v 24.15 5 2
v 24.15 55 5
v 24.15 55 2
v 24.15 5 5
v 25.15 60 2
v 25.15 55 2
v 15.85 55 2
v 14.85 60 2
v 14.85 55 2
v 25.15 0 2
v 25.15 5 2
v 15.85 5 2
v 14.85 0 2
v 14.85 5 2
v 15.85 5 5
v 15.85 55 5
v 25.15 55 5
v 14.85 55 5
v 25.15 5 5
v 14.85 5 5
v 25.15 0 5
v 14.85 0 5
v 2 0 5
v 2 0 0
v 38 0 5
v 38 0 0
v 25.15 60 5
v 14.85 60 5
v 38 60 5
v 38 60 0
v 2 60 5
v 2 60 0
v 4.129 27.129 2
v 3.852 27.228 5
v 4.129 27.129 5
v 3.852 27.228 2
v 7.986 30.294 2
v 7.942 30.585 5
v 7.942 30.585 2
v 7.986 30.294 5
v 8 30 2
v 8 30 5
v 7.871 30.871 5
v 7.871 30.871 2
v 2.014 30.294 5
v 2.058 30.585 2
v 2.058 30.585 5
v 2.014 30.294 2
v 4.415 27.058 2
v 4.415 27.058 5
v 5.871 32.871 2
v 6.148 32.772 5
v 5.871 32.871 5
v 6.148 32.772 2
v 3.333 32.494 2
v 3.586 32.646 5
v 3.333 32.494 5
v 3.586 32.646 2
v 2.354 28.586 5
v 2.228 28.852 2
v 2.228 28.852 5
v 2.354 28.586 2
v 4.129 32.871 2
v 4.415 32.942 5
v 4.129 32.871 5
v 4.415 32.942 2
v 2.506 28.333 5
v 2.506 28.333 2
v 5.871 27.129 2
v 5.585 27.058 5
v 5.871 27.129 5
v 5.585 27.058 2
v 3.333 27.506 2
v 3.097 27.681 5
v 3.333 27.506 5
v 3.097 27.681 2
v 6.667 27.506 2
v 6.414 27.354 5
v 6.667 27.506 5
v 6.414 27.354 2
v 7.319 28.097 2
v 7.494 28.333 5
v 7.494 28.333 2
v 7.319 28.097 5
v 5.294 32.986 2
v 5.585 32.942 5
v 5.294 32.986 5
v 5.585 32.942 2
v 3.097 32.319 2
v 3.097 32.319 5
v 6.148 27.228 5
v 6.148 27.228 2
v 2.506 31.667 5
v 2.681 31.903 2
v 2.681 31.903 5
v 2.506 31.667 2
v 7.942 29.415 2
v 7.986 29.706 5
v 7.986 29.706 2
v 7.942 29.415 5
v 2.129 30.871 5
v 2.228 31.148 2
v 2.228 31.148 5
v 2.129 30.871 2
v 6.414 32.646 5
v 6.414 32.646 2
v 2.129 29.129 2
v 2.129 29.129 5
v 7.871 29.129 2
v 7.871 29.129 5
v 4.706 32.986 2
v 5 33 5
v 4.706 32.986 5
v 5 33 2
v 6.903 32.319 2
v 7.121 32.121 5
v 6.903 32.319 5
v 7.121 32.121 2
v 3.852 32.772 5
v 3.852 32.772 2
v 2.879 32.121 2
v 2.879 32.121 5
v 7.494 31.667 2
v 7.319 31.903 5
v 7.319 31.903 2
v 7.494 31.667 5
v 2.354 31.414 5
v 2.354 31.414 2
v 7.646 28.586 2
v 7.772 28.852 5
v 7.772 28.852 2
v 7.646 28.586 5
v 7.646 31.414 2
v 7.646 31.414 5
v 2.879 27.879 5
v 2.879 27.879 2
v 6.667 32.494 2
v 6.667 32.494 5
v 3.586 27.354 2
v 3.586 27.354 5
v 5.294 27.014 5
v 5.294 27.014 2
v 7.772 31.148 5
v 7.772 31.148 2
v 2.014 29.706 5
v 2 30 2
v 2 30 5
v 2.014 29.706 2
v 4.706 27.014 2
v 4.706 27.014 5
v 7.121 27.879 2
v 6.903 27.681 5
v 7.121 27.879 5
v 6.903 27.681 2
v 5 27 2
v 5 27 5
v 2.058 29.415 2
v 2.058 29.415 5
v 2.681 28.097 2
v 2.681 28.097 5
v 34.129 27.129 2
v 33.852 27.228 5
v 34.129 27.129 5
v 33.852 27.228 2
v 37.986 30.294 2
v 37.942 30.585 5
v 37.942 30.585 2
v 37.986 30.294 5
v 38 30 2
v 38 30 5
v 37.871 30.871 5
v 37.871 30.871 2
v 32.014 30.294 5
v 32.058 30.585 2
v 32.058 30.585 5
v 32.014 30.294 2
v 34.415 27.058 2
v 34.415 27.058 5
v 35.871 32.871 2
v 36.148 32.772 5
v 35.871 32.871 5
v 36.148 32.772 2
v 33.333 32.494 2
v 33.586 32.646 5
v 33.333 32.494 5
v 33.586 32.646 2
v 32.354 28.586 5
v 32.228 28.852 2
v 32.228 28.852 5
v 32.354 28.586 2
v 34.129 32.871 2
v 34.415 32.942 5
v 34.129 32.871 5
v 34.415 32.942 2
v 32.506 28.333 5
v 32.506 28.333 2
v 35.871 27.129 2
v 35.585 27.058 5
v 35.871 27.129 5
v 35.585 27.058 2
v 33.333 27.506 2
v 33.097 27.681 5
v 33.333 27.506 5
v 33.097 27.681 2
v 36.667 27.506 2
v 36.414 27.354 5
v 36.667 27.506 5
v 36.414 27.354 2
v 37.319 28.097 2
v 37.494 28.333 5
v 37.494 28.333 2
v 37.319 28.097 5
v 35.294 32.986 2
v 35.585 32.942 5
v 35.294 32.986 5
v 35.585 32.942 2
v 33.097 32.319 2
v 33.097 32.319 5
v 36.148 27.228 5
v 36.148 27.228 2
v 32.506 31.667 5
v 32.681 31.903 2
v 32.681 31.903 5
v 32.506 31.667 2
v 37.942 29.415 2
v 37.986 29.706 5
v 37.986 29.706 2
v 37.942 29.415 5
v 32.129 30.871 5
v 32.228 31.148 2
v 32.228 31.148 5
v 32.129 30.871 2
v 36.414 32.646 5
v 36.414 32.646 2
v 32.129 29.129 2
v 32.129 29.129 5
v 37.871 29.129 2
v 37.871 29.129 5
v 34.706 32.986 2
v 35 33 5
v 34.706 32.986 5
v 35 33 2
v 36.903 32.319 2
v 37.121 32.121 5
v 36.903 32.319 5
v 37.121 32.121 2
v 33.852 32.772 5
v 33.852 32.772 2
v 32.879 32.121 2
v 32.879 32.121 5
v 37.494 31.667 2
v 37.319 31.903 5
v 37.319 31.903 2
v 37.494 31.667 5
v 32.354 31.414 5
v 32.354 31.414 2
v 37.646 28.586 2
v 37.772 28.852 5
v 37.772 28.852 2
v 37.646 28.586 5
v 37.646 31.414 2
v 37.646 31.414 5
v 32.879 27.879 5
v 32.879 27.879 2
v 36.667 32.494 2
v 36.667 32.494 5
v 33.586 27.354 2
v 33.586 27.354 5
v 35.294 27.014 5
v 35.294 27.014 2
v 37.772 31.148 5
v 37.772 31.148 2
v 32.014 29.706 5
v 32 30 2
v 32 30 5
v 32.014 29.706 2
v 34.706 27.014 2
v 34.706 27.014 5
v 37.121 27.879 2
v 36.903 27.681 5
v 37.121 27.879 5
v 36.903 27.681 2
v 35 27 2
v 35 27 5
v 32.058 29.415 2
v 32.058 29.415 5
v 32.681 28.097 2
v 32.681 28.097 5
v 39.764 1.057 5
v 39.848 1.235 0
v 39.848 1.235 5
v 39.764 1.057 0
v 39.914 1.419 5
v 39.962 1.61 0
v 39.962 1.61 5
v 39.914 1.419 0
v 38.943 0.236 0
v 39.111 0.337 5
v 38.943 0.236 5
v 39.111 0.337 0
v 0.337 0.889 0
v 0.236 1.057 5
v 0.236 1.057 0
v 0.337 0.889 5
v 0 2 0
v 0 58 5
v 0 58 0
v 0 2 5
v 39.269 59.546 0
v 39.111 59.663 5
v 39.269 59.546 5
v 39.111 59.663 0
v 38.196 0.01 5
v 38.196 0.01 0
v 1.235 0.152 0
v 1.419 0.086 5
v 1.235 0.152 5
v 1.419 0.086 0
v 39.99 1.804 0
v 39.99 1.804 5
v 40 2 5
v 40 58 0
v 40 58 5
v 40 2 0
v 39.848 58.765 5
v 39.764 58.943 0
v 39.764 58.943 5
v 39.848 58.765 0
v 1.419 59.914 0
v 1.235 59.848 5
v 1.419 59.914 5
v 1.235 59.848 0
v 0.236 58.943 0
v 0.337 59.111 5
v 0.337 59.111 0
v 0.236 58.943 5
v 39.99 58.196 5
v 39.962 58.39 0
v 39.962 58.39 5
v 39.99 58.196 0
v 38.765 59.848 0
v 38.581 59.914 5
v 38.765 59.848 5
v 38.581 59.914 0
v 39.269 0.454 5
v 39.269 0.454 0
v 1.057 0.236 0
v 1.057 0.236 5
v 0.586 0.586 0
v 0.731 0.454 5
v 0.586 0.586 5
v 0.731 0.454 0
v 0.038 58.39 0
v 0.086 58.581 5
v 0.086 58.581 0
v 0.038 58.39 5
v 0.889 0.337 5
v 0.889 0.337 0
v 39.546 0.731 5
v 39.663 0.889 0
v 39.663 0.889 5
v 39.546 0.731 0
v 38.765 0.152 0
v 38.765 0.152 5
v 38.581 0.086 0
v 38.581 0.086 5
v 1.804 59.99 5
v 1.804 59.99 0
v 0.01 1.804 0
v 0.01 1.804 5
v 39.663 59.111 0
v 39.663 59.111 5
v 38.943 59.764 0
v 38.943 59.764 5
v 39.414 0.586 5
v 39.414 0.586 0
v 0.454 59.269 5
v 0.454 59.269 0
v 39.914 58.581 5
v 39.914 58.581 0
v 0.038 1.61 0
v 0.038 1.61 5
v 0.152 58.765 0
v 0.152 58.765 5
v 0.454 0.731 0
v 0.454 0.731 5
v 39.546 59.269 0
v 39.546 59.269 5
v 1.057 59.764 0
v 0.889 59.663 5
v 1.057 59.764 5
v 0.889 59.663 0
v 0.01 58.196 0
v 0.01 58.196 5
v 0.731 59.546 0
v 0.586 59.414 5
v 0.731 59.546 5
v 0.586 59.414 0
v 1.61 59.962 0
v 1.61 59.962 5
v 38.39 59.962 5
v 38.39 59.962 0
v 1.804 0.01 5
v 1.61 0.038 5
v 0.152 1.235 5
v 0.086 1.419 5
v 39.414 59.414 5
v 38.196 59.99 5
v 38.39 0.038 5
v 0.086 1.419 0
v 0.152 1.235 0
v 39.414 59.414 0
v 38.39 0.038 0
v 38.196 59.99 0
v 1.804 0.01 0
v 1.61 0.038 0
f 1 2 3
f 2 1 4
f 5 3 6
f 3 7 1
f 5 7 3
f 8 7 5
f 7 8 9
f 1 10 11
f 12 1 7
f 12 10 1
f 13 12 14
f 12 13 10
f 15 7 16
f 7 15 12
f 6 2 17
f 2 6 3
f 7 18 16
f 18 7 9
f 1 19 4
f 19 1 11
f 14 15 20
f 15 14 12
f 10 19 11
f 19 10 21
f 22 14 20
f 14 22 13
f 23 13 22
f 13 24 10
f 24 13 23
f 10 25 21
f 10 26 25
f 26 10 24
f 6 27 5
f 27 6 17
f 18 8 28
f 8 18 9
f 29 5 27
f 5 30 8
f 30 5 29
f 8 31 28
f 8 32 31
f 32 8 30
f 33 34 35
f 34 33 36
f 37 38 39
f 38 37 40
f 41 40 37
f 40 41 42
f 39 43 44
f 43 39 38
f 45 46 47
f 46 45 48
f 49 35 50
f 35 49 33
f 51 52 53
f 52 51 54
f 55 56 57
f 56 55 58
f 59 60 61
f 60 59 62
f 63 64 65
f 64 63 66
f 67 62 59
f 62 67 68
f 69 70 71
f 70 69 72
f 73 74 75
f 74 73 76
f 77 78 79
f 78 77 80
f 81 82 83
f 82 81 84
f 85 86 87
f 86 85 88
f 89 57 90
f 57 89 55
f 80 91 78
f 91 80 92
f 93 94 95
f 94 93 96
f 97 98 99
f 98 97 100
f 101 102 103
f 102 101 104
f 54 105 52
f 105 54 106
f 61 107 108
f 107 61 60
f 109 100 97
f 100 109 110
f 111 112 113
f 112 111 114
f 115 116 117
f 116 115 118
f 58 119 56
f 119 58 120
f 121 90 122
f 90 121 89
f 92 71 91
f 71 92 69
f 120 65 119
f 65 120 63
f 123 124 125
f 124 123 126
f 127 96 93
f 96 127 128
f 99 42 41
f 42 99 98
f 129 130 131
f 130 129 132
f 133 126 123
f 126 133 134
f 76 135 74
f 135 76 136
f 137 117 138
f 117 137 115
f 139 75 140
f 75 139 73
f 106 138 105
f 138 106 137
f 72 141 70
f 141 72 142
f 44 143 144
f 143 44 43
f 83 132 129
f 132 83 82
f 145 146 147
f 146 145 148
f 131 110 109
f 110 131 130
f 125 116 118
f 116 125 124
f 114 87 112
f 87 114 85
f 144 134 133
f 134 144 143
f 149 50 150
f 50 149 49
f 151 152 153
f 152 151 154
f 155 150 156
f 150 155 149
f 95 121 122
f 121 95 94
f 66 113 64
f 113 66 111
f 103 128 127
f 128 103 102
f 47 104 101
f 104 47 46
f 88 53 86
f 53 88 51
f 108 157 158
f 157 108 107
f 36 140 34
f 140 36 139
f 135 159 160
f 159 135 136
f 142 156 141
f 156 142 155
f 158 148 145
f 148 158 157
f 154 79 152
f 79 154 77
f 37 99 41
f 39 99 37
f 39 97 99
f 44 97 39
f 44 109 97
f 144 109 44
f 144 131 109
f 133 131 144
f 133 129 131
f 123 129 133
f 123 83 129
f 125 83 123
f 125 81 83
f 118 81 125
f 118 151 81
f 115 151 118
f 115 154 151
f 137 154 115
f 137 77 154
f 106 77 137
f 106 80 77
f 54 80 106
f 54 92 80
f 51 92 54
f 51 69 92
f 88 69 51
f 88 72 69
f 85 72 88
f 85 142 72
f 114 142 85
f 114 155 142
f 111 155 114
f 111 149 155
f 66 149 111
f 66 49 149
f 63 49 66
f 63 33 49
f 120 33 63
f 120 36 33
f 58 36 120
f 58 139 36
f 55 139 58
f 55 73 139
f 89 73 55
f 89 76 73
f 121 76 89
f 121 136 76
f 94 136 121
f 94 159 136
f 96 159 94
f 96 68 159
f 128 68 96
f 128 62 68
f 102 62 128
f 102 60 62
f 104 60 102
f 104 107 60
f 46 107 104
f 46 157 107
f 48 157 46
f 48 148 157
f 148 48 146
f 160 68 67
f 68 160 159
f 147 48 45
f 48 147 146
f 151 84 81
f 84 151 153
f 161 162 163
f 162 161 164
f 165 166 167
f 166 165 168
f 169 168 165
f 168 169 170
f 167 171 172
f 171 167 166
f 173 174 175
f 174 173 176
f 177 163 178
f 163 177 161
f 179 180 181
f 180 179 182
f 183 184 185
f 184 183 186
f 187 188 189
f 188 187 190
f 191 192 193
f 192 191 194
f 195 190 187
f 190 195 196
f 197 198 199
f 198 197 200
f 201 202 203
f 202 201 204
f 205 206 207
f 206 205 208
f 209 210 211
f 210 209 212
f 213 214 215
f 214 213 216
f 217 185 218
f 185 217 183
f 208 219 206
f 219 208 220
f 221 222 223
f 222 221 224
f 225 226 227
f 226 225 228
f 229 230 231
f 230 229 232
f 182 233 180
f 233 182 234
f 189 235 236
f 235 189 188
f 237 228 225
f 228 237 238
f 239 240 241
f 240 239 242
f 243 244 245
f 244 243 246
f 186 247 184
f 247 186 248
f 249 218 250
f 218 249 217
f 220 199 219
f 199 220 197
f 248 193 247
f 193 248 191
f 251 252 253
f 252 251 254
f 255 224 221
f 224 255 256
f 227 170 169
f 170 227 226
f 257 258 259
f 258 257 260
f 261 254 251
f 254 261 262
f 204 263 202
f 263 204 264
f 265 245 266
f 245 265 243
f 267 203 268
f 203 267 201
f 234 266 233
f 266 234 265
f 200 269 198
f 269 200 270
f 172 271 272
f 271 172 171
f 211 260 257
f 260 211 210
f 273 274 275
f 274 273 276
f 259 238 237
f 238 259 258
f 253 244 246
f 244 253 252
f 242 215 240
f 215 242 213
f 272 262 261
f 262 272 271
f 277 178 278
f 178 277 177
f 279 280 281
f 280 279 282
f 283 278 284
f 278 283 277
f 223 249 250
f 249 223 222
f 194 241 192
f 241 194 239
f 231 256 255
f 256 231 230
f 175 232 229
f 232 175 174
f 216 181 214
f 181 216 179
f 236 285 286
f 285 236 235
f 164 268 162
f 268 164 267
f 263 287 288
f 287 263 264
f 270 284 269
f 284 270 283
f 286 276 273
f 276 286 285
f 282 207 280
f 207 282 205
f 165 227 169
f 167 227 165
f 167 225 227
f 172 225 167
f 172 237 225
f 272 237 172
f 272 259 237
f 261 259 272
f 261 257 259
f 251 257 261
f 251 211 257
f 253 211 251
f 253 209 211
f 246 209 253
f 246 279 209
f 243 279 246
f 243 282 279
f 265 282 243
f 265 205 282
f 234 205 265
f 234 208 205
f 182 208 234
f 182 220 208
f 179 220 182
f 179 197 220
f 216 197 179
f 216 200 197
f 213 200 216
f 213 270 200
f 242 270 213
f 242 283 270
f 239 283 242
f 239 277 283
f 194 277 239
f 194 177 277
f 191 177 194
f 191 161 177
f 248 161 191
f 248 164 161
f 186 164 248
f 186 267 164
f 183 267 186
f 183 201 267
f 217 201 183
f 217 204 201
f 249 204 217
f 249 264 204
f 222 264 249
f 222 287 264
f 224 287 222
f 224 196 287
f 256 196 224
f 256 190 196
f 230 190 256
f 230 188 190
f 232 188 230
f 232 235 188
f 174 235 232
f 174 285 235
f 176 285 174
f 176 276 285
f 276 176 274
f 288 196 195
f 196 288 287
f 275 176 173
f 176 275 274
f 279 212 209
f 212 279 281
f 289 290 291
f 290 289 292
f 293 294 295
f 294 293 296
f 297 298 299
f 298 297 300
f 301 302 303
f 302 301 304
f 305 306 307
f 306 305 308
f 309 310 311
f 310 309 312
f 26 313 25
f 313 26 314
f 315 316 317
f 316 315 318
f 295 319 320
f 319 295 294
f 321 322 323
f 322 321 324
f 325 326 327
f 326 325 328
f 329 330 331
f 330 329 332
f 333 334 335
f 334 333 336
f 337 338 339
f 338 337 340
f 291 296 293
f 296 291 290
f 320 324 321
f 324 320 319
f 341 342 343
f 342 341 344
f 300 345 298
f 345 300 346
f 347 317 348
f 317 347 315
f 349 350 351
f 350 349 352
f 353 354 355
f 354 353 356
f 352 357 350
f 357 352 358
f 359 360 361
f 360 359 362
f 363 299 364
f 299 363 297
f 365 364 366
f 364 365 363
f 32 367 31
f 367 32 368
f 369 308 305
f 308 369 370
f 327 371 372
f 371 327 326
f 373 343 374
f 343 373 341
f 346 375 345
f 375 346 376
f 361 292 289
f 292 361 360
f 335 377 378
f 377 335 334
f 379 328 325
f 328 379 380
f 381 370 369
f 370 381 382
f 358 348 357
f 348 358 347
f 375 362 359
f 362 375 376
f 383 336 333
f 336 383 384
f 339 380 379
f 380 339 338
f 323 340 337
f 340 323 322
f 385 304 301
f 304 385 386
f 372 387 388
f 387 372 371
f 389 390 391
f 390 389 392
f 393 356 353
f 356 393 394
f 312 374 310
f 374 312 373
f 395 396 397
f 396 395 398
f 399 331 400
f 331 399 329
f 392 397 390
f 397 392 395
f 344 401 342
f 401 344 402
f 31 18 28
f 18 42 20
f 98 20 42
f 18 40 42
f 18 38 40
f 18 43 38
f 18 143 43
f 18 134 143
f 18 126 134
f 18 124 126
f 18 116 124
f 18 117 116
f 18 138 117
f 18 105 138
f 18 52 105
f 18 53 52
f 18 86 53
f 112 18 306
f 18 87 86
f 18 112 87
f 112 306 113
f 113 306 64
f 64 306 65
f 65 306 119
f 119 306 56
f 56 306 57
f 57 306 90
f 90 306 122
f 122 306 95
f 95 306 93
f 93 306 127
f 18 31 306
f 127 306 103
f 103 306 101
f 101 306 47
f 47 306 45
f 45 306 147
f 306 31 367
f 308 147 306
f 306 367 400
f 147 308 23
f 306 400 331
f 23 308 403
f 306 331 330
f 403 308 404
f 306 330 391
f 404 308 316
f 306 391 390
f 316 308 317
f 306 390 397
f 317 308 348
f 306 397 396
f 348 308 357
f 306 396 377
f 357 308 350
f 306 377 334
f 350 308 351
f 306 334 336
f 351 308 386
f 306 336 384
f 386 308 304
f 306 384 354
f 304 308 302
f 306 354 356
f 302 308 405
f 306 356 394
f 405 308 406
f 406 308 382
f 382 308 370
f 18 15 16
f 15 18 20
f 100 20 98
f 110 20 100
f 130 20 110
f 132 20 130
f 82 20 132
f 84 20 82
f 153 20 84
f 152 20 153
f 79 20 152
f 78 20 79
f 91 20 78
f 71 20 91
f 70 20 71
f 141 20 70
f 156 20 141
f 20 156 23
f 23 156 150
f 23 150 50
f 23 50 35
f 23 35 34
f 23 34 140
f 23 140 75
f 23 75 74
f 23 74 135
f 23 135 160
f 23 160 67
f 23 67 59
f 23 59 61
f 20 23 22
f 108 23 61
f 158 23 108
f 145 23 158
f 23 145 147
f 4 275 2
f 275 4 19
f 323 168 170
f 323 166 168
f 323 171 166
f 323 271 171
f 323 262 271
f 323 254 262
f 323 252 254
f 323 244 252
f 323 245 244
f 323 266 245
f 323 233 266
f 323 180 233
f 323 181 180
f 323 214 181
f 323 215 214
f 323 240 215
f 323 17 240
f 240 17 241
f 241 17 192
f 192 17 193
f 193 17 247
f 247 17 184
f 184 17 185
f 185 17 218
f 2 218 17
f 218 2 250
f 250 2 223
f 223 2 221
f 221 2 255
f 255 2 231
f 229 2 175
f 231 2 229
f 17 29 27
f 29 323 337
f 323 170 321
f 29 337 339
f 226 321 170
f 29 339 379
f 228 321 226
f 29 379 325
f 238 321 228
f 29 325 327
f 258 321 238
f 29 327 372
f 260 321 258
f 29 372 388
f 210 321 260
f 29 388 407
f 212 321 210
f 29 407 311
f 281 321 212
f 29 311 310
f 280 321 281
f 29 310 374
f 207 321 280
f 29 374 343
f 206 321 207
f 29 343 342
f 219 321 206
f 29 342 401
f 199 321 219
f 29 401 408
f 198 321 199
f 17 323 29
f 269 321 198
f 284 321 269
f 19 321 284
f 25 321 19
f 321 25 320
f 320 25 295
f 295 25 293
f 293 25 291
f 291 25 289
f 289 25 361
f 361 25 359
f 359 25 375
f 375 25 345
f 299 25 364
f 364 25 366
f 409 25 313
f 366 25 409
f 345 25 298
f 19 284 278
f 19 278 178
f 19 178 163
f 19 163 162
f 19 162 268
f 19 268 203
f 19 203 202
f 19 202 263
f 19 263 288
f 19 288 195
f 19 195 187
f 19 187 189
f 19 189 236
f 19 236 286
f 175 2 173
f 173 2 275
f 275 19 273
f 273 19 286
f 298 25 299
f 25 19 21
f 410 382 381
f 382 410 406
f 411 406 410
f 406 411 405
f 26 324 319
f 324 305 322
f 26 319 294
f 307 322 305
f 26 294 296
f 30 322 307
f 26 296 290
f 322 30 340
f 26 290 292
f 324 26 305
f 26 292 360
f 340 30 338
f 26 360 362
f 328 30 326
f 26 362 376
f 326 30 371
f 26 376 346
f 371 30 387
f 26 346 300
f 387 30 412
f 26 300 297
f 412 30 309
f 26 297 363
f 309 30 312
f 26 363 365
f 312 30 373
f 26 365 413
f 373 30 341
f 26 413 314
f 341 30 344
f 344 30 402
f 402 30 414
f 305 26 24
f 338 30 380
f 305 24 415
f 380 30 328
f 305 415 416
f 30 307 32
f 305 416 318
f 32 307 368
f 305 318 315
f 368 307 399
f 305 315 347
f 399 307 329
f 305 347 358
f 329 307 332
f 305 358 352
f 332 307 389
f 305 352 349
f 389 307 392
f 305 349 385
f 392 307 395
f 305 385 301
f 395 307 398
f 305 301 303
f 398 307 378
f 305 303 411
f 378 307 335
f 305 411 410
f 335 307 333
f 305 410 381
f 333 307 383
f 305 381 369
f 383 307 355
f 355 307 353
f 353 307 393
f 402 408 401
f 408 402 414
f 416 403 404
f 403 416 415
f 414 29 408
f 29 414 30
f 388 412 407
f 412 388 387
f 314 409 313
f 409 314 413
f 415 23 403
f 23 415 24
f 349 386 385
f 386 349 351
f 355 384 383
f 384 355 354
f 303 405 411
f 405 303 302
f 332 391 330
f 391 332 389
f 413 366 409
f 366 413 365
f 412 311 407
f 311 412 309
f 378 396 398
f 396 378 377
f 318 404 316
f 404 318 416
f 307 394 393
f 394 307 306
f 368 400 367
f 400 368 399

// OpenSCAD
// Strip Feeder with Magnetic Holders for MicroSMT v3
// Based on the MicroSMT v3 magnetic slot design
// Supports 8mm, 12mm, 16mm, and 24mm tape widths

/* [Main Parameters] */
// Tape width in mm (8, 12, 16, or 24)
tape_width = 8; // [8:4:24]

// Number of feeder slots
num_slots = 1; // [1:1:10]

// Render mode
render_mode = "single"; // [single:Single Slot, array:Array of Slots, base:Base Only]

/* [Dimensions] */
// Base dimensions
base_length = 60;
base_width = 40;
base_height = 5;

// Slot dimensions (adjusted based on tape width)
slot_length = 50;
slot_depth = 3;

// Magnetic holder mounting
magnet_diameter = 6;
magnet_depth = 3;
magnet_spacing = 30; // Distance between magnet centers

// Wall thickness
wall_thickness = 2;

/* [Advanced Settings] */
// Tolerance for tape fit
tape_tolerance = 0.3;

// Corner radius for rounded edges
corner_radius = 2;

// Show magnets (for visualization)
show_magnets = false;

/* [Hidden] */
$fn = 64;

// Calculate slot width based on tape width with tolerance
slot_width = tape_width + tape_tolerance;

module rounded_cube(size, radius) {
    hull() {
        translate([radius, radius, 0])
            cylinder(r=radius, h=size[2]);
        translate([size[0]-radius, radius, 0])
            cylinder(r=radius, h=size[2]);
        translate([radius, size[1]-radius, 0])
            cylinder(r=radius, h=size[2]);
        translate([size[0]-radius, size[1]-radius, 0])
            cylinder(r=radius, h=size[2]);
    }
}

module magnet_hole() {
    cylinder(d=magnet_diameter, h=magnet_depth + 0.1);
}

module magnet_holes_array() {
    // Two magnets along the X-axis for stable mounting
    // Left magnet (negative X direction)
    translate([base_width/2 - magnet_spacing/2, base_length/2, base_height - magnet_depth])
        magnet_hole();
    // Right magnet (positive X direction)
    translate([base_width/2 + magnet_spacing/2, base_length/2, base_height - magnet_depth])
        magnet_hole();
}

module tape_channel() {
    // Main tape channel
    translate([base_width/2 - slot_width/2, (base_length - slot_length)/2, base_height - slot_depth])
        cube([slot_width, slot_length, slot_depth + 0.1]);
    
    // Entry and exit chamfers
    translate([base_width/2 - slot_width/2 - 1, (base_length - slot_length)/2 - 5, base_height - slot_depth])
        cube([slot_width + 2, 5, slot_depth + 0.1]);
    translate([base_width/2 - slot_width/2 - 1, (base_length - slot_length)/2 + slot_length, base_height - slot_depth])
        cube([slot_width + 2, 5, slot_depth + 0.1]);
}

module single_feeder_slot() {
    difference() {
        // Main base
        rounded_cube([base_width, base_length, base_height], corner_radius);
        
        // Tape channel
        tape_channel();
        
        // Magnet holes
        magnet_holes_array();
    }
    
    // Visual magnets (for reference)
    if (show_magnets) {
        color("silver", 0.8) {
            translate([base_width/2 - magnet_spacing/2, base_length/2, base_height - magnet_depth])
                cylinder(d=magnet_diameter, h=magnet_depth);
            translate([base_width/2 + magnet_spacing/2, base_length/2, base_height - magnet_depth])
                cylinder(d=magnet_diameter, h=magnet_depth);
        }
    }
}

module feeder_array() {
    for (i = [0:num_slots-1]) {
        translate([i * (base_width + 2), 0, 0])
            single_feeder_slot();
    }
}

module base_plate() {
    // Base mounting plate for multiple feeders
    plate_width = num_slots * (base_width + 2) + 10;
    plate_length = base_length + 10;
    plate_height = 3;
    
    difference() {
        rounded_cube([plate_width, plate_length, plate_height], corner_radius);
        
        // Mounting holes at corners
        for (x = [10, plate_width - 10]) {
            for (y = [10, plate_length - 10]) {
                translate([x, y, -0.1])
                    cylinder(d=3.5, h=plate_height + 0.2);
            }
        }
    }
}

// Main render logic
if (render_mode == "single") {
    single_feeder_slot();
} else if (render_mode == "array") {
    feeder_array();
} else if (render_mode == "base") {
    base_plate();
}

// Information
echo(str("Strip Feeder Configuration:"));
echo(str("  Tape Width: ", tape_width, "mm"));
echo(str("  Slot Width: ", slot_width, "mm"));
echo(str("  Number of Slots: ", num_slots));
echo(str("  Magnet Diameter: ", magnet_diameter, "mm"));
echo(str("  Magnet Depth: ", magnet_depth, "mm"));
